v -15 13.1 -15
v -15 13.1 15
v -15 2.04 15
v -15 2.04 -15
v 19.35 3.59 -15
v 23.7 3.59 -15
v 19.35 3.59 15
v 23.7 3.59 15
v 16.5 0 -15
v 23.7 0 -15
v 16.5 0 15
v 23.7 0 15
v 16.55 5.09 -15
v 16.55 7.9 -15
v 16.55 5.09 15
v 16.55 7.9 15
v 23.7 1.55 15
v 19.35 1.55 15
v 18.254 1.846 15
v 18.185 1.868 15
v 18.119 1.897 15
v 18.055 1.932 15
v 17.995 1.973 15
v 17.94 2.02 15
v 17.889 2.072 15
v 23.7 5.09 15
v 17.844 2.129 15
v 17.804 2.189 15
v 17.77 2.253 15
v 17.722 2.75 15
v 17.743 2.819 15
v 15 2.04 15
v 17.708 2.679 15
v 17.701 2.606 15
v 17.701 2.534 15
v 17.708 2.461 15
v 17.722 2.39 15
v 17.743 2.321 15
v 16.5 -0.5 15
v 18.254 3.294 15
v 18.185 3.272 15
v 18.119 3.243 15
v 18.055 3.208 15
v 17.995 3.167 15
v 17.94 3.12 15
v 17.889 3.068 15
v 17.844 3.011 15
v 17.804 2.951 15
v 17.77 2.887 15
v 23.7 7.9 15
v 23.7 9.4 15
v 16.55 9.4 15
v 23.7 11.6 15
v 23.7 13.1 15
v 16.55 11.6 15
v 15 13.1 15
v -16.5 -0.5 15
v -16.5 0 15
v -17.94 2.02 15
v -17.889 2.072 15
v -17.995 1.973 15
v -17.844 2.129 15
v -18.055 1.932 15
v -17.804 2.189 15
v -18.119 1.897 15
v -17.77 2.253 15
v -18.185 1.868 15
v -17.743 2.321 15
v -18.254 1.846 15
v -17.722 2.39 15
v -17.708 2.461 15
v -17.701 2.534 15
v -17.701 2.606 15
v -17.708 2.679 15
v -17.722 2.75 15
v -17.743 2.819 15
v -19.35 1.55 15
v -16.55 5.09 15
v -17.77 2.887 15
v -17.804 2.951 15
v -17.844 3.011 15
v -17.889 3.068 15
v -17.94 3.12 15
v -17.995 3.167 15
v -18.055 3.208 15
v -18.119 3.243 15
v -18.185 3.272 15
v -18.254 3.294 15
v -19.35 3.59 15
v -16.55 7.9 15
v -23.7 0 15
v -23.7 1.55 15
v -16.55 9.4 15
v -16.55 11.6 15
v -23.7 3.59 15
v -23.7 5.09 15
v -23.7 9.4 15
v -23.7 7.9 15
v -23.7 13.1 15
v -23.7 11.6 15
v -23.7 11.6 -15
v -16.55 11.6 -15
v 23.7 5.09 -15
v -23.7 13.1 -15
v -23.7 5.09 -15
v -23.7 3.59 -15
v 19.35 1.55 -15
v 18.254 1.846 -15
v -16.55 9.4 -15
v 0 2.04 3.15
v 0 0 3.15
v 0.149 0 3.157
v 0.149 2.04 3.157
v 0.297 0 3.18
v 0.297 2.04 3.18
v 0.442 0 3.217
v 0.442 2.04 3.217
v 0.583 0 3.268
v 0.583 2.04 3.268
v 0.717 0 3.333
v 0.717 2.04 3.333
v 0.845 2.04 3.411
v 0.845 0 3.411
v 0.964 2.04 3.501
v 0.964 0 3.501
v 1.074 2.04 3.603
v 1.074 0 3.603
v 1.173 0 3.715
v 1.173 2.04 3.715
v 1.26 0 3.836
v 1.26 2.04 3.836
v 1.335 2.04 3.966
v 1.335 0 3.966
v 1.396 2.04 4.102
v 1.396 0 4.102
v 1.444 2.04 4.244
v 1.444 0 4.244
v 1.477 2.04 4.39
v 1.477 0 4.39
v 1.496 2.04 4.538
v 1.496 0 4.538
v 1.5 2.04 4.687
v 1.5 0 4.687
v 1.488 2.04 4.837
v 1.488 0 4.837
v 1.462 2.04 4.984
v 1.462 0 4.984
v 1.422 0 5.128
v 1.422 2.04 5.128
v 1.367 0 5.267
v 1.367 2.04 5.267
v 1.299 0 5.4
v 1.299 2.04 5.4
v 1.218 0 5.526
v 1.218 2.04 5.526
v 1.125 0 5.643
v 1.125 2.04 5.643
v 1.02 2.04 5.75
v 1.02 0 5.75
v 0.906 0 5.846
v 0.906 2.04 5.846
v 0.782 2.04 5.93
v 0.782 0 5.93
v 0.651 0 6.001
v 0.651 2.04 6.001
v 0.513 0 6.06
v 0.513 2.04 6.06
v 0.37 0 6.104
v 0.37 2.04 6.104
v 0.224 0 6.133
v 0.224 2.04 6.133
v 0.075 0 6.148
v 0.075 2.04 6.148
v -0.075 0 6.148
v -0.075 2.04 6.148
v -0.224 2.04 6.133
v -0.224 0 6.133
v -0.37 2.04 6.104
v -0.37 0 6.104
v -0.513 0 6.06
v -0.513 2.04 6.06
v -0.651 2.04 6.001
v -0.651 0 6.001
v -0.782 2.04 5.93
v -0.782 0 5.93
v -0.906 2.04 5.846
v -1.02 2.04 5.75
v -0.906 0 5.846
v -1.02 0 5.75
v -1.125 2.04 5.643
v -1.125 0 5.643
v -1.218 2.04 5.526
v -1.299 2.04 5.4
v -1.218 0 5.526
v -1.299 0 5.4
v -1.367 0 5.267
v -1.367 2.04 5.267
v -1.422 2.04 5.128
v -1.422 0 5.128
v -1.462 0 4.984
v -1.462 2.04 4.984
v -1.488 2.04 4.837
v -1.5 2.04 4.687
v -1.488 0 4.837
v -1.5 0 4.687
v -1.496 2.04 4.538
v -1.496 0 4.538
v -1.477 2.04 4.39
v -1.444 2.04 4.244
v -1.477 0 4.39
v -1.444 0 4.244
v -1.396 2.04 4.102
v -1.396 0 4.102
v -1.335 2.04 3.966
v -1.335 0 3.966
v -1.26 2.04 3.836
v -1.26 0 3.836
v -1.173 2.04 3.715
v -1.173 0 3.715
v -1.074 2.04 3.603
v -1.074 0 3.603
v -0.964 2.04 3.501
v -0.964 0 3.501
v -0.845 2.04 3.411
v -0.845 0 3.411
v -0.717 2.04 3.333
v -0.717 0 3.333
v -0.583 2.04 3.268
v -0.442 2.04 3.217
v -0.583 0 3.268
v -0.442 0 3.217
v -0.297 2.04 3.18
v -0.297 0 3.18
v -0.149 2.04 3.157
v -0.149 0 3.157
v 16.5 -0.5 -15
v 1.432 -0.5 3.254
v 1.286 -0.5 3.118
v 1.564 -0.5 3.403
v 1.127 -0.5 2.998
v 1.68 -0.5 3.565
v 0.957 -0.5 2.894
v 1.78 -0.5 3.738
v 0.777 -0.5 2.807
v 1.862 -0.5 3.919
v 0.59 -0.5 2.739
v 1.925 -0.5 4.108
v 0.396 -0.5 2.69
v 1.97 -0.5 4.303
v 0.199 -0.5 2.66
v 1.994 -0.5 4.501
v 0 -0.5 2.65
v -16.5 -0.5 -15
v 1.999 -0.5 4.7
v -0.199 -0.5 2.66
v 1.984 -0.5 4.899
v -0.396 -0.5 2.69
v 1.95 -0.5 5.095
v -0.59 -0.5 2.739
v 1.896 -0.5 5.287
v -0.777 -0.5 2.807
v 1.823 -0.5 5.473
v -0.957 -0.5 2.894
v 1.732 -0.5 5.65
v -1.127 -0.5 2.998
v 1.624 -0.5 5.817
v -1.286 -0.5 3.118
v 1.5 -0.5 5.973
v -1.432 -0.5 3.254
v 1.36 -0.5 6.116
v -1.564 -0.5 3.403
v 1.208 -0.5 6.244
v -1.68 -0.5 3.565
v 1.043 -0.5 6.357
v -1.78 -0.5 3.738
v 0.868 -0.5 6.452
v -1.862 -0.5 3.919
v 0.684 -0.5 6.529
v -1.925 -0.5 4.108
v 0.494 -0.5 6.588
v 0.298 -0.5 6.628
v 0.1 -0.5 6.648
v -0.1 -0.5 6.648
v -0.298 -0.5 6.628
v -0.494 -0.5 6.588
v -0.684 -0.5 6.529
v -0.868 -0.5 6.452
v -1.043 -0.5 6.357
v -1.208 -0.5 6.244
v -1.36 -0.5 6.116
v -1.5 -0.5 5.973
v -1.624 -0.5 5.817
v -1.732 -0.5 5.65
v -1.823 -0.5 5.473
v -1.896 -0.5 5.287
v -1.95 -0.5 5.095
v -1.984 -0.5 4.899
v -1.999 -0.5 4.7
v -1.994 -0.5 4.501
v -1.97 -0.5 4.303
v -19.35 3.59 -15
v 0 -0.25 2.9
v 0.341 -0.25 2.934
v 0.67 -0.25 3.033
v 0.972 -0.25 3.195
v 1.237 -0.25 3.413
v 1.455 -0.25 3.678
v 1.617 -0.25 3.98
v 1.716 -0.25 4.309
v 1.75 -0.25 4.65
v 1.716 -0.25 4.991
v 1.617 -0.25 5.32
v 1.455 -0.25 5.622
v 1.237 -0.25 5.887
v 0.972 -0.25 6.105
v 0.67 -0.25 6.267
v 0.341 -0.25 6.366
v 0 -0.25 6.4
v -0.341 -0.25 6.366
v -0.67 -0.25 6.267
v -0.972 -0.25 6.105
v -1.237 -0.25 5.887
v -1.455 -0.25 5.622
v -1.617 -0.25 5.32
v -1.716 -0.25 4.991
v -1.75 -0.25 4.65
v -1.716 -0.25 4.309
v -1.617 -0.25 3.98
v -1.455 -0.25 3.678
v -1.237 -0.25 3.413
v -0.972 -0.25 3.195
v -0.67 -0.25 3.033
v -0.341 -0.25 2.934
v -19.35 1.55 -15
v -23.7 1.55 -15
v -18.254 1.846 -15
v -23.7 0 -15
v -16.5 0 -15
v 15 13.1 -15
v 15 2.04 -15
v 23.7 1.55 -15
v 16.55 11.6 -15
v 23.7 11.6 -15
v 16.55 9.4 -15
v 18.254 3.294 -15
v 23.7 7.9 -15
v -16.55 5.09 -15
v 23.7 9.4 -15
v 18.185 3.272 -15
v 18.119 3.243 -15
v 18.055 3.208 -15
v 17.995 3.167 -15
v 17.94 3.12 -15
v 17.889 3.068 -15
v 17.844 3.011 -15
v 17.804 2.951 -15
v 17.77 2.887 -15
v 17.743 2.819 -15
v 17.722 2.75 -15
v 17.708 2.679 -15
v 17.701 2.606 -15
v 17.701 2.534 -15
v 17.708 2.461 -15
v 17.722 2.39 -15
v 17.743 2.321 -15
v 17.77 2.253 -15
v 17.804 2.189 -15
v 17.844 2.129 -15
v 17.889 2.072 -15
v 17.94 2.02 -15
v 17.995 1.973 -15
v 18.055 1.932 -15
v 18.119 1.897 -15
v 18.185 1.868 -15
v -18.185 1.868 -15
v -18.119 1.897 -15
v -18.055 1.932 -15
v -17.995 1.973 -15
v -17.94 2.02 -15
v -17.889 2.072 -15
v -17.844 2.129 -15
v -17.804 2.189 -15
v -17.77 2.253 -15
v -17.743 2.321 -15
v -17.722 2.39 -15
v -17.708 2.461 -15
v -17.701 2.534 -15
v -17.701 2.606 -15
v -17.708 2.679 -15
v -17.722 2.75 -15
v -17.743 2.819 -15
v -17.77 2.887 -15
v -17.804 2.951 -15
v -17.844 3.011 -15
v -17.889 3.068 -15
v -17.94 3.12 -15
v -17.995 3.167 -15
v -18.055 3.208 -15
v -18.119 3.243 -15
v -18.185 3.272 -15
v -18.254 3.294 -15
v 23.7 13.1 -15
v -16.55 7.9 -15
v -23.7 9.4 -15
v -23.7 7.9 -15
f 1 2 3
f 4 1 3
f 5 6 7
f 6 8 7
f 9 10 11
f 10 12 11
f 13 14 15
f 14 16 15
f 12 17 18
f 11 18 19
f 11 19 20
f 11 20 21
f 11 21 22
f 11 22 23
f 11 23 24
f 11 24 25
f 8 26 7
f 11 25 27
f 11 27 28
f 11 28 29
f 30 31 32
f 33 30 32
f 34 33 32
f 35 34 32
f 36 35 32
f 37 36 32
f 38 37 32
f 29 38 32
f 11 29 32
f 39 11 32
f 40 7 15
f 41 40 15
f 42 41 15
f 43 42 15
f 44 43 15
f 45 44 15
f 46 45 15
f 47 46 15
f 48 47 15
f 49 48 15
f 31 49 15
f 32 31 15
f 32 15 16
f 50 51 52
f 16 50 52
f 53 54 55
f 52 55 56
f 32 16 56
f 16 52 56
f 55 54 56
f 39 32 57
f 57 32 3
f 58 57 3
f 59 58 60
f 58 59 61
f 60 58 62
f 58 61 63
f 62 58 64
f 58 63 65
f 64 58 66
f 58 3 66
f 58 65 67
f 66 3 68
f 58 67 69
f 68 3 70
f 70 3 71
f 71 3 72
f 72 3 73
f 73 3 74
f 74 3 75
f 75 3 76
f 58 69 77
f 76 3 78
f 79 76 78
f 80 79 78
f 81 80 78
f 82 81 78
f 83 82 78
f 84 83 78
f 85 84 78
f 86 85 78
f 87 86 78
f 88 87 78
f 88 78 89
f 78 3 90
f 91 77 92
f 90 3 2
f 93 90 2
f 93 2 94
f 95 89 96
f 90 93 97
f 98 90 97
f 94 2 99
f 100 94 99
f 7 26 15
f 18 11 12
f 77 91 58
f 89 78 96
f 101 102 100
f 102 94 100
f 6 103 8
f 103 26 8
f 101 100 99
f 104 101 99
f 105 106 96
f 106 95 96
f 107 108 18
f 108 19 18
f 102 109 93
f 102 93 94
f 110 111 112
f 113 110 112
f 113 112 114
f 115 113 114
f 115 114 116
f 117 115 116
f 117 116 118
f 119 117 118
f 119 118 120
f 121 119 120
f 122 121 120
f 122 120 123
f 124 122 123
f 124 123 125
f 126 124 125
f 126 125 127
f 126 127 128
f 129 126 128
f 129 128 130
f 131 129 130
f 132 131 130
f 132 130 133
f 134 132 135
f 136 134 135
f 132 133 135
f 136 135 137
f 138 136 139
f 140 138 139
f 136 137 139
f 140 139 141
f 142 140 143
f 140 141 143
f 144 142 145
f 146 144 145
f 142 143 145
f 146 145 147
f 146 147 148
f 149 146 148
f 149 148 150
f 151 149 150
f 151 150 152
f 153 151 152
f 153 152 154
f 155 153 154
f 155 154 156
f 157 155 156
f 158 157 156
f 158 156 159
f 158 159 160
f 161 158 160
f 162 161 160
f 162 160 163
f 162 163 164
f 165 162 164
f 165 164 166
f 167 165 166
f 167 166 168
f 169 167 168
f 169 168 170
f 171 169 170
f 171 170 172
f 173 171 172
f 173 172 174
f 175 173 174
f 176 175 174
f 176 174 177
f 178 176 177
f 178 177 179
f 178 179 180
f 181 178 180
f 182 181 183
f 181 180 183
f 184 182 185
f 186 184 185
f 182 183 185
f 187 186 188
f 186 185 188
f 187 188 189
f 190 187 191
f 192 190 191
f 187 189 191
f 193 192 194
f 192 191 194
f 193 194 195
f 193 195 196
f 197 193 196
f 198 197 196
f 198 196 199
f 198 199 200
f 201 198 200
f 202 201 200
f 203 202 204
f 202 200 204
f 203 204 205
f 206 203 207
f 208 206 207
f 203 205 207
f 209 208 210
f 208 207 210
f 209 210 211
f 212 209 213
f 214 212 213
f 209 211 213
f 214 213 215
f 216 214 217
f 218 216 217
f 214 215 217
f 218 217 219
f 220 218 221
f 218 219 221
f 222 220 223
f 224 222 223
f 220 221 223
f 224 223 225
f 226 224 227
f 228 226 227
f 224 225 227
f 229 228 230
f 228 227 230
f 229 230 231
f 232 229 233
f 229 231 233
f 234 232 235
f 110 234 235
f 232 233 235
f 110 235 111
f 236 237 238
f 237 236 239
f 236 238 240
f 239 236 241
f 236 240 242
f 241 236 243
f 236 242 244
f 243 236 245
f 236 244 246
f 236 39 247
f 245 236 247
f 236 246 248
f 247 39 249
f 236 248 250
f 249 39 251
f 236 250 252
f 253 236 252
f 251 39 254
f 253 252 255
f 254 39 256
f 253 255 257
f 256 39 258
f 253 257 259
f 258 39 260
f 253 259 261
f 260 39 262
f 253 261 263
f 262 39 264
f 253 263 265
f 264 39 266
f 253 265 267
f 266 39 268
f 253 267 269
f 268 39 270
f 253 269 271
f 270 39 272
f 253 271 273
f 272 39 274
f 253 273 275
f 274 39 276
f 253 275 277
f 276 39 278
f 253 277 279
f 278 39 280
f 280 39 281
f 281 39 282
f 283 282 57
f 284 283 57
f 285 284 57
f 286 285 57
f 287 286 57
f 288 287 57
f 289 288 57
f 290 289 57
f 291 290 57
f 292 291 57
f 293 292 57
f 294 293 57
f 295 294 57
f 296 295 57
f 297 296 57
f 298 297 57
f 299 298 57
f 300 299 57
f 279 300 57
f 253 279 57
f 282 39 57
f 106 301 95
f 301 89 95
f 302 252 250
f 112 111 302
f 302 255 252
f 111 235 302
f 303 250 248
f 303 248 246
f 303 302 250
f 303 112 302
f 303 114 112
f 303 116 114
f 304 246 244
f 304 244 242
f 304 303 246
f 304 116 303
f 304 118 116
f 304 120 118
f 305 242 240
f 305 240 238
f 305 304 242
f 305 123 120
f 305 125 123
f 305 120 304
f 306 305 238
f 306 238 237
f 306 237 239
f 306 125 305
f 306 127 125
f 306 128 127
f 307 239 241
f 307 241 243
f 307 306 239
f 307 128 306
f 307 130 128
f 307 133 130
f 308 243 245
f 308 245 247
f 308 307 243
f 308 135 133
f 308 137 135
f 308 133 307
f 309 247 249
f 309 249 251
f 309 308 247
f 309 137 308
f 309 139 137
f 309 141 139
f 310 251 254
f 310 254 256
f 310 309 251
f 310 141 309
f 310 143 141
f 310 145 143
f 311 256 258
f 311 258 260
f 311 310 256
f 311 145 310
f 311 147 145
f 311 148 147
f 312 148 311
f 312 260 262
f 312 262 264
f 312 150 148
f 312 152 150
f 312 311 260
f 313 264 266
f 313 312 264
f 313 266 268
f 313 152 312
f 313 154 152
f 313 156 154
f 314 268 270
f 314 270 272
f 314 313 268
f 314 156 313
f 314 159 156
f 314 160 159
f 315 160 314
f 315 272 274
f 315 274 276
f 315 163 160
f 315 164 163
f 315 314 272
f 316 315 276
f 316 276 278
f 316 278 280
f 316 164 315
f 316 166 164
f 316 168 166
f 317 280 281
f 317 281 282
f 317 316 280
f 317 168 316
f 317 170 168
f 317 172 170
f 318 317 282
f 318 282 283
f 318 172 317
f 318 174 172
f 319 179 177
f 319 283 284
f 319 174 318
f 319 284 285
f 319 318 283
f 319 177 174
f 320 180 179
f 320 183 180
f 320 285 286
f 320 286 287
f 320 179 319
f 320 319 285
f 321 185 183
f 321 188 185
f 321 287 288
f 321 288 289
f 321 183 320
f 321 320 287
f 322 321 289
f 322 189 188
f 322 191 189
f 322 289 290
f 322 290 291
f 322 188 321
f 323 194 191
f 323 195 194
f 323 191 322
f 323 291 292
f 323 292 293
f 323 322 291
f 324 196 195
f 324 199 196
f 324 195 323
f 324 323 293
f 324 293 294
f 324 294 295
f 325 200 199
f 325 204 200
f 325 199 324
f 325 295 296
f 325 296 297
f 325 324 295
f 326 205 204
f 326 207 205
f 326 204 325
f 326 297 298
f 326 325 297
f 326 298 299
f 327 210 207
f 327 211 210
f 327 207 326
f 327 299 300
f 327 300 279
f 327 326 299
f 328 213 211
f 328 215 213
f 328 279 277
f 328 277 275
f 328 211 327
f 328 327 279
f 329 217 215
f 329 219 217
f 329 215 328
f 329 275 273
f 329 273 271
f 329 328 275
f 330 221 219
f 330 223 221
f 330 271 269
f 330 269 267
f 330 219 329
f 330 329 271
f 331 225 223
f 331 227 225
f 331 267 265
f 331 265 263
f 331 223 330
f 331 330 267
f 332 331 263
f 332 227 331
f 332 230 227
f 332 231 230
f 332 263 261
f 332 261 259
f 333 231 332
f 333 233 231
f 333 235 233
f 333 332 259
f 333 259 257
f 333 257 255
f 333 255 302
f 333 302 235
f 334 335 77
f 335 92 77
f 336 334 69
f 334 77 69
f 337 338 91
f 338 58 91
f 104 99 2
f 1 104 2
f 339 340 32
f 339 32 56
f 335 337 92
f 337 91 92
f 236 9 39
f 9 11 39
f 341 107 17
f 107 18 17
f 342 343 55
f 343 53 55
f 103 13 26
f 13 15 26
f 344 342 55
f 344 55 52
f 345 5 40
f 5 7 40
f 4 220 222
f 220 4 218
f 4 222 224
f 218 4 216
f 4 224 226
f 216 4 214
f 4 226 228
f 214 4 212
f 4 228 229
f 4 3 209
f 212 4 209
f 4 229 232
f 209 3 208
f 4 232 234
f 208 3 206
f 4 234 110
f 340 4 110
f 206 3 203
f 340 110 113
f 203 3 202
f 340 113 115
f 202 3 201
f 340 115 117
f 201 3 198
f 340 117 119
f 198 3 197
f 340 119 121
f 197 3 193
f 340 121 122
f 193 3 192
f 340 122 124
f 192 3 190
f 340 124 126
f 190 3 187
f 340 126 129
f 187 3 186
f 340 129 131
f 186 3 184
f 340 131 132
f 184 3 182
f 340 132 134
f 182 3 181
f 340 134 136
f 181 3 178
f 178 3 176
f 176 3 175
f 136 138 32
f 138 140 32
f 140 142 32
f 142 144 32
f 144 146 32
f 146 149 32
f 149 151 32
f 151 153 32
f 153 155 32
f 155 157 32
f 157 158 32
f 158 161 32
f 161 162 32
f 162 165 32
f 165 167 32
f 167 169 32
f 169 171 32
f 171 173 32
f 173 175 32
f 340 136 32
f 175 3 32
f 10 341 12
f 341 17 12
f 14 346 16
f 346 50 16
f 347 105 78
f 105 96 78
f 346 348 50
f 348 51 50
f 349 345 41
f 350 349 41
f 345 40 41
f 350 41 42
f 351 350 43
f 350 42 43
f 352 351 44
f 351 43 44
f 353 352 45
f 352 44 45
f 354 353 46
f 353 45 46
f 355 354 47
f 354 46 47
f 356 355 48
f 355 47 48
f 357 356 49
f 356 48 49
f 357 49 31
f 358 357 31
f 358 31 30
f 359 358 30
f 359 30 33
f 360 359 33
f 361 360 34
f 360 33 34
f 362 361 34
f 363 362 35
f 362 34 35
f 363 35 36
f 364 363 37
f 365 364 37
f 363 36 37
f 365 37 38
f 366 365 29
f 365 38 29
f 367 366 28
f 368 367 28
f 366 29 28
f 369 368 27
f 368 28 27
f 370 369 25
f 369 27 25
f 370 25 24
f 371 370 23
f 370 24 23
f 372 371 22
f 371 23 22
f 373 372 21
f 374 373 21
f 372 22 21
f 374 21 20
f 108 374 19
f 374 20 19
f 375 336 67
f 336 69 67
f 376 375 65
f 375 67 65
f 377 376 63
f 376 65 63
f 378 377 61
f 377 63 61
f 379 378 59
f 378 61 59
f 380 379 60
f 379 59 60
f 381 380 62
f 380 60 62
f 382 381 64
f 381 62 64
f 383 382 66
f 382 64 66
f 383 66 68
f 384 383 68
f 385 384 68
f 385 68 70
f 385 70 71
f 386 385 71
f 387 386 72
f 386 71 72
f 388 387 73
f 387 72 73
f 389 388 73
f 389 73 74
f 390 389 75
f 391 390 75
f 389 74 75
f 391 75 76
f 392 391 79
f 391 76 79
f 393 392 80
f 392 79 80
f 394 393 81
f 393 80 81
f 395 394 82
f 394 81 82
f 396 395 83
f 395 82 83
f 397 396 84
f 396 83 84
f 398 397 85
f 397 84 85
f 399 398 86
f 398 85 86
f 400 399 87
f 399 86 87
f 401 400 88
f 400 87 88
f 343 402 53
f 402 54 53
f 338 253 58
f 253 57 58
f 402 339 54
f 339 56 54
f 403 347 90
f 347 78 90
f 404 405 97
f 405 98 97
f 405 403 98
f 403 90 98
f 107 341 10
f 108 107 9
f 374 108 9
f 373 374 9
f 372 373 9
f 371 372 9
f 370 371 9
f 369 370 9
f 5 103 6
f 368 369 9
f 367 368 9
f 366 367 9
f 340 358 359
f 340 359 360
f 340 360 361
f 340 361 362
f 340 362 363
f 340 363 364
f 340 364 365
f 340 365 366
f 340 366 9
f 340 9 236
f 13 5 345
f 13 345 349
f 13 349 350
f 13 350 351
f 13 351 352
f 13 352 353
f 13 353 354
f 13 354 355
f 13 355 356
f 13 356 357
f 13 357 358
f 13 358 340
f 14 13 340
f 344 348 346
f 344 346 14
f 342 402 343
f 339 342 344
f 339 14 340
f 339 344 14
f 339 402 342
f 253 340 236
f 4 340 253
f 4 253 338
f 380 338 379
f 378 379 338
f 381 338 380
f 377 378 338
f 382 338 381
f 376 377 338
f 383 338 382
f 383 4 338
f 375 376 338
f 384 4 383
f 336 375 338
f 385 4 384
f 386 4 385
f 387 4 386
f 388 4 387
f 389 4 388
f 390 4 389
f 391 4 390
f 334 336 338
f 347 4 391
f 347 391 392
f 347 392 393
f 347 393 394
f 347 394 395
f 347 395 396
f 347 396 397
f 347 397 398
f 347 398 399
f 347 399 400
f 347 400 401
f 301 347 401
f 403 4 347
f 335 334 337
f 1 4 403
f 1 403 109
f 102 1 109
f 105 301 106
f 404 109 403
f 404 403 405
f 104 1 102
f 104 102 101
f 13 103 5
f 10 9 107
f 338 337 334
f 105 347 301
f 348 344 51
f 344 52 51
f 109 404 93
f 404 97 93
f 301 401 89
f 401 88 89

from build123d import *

# Parameters (mm, degrees)
BOSS_EXTRUDE1_DEPTH = 15
SKETCH2_R           = 1.5
CUT_EXTRUDE1_DEPTH  = 32.171300903
CHAMFER1_SIZE       = 0.5


with BuildPart() as part:
    # Sketch1 → Boss-Extrude1 (new, symmetric)
    with BuildSketch(Plane.XY):
        with BuildLine():
            Line((-15, 13.1), (-15, 2.04))
            Line((-15, 2.04), (15, 2.04))
            Line((15, 2.04), (15, 13.1))
            Line((15, 13.1), (23.7, 13.1))
            Line((23.7, 13.1), (23.7, 11.6))
            Line((23.7, 11.6), (16.55, 11.6))
            Line((16.55, 11.6), (16.55, 9.4))
            Line((16.55, 9.4), (23.7, 9.4))
            Line((23.7, 9.4), (23.7, 7.9))
            Line((23.7, 7.9), (16.55, 7.9))
            Line((16.55, 7.9), (16.55, 5.09))
            Line((16.55, 5.09), (23.7, 5.09))
            Line((23.7, 5.09), (23.7, 3.59))
            Line((23.7, 3.59), (19.35, 3.59))
            Line((19.35, 3.59), (18.254412307, 3.294047964))
            ThreePointArc((18.254412307, 3.294047964), (17.7, 2.57), (18.254412307, 1.845952036))
            Line((18.254412307, 1.845952036), (19.35, 1.55))
            Line((19.35, 1.55), (23.7, 1.55))
            Line((23.7, 1.55), (23.7, 0))
            Line((23.7, 0), (16.5, 0))
            Line((16.5, 0), (16.5, -0.5))
            Line((16.5, -0.5), (-16.5, -0.5))
            Line((-16.5, -0.5), (-16.5, 0))
            Line((-16.5, 0), (-23.7, 0))
            Line((-23.7, 0), (-23.7, 1.55))
            Line((-23.7, 1.55), (-19.35, 1.55))
            Line((-19.35, 1.55), (-18.254412307, 1.845952036))
            ThreePointArc((-18.254412307, 1.845952036), (-17.7, 2.57), (-18.254412307, 3.294047964))
            Line((-18.254412307, 3.294047964), (-19.35, 3.59))
            Line((-19.35, 3.59), (-23.7, 3.59))
            Line((-23.7, 3.59), (-23.7, 5.09))
            Line((-23.7, 5.09), (-16.55, 5.09))
            Line((-16.55, 5.09), (-16.55, 7.9))
            Line((-16.55, 7.9), (-23.7, 7.9))
            Line((-23.7, 7.9), (-23.7, 9.4))
            Line((-23.7, 9.4), (-16.55, 9.4))
            Line((-16.55, 9.4), (-16.55, 11.6))
            Line((-16.55, 11.6), (-23.7, 11.6))
            Line((-23.7, 11.6), (-23.7, 13.1))
            Line((-23.7, 13.1), (-15, 13.1))
        make_face()
    extrude(amount=BOSS_EXTRUDE1_DEPTH, both=True)

    # Sketch2 → Cut-Extrude1 (cut, through all)
    with BuildSketch(Plane.XZ.offset(0.5)):
        with Locations(Location((0, 4.65, 0), (0, 0, 270))):
            Circle(SKETCH2_R)
    extrude(amount=-CUT_EXTRUDE1_DEPTH, mode=Mode.SUBTRACT)

    # Chamfer1
    chamfer1_edges = [part.edges().sort_by_distance(p)[0] for p in [
        (0, -0.5, 6.15),
    ]]
    chamfer(chamfer1_edges, length=CHAMFER1_SIZE)


solid = part.part
